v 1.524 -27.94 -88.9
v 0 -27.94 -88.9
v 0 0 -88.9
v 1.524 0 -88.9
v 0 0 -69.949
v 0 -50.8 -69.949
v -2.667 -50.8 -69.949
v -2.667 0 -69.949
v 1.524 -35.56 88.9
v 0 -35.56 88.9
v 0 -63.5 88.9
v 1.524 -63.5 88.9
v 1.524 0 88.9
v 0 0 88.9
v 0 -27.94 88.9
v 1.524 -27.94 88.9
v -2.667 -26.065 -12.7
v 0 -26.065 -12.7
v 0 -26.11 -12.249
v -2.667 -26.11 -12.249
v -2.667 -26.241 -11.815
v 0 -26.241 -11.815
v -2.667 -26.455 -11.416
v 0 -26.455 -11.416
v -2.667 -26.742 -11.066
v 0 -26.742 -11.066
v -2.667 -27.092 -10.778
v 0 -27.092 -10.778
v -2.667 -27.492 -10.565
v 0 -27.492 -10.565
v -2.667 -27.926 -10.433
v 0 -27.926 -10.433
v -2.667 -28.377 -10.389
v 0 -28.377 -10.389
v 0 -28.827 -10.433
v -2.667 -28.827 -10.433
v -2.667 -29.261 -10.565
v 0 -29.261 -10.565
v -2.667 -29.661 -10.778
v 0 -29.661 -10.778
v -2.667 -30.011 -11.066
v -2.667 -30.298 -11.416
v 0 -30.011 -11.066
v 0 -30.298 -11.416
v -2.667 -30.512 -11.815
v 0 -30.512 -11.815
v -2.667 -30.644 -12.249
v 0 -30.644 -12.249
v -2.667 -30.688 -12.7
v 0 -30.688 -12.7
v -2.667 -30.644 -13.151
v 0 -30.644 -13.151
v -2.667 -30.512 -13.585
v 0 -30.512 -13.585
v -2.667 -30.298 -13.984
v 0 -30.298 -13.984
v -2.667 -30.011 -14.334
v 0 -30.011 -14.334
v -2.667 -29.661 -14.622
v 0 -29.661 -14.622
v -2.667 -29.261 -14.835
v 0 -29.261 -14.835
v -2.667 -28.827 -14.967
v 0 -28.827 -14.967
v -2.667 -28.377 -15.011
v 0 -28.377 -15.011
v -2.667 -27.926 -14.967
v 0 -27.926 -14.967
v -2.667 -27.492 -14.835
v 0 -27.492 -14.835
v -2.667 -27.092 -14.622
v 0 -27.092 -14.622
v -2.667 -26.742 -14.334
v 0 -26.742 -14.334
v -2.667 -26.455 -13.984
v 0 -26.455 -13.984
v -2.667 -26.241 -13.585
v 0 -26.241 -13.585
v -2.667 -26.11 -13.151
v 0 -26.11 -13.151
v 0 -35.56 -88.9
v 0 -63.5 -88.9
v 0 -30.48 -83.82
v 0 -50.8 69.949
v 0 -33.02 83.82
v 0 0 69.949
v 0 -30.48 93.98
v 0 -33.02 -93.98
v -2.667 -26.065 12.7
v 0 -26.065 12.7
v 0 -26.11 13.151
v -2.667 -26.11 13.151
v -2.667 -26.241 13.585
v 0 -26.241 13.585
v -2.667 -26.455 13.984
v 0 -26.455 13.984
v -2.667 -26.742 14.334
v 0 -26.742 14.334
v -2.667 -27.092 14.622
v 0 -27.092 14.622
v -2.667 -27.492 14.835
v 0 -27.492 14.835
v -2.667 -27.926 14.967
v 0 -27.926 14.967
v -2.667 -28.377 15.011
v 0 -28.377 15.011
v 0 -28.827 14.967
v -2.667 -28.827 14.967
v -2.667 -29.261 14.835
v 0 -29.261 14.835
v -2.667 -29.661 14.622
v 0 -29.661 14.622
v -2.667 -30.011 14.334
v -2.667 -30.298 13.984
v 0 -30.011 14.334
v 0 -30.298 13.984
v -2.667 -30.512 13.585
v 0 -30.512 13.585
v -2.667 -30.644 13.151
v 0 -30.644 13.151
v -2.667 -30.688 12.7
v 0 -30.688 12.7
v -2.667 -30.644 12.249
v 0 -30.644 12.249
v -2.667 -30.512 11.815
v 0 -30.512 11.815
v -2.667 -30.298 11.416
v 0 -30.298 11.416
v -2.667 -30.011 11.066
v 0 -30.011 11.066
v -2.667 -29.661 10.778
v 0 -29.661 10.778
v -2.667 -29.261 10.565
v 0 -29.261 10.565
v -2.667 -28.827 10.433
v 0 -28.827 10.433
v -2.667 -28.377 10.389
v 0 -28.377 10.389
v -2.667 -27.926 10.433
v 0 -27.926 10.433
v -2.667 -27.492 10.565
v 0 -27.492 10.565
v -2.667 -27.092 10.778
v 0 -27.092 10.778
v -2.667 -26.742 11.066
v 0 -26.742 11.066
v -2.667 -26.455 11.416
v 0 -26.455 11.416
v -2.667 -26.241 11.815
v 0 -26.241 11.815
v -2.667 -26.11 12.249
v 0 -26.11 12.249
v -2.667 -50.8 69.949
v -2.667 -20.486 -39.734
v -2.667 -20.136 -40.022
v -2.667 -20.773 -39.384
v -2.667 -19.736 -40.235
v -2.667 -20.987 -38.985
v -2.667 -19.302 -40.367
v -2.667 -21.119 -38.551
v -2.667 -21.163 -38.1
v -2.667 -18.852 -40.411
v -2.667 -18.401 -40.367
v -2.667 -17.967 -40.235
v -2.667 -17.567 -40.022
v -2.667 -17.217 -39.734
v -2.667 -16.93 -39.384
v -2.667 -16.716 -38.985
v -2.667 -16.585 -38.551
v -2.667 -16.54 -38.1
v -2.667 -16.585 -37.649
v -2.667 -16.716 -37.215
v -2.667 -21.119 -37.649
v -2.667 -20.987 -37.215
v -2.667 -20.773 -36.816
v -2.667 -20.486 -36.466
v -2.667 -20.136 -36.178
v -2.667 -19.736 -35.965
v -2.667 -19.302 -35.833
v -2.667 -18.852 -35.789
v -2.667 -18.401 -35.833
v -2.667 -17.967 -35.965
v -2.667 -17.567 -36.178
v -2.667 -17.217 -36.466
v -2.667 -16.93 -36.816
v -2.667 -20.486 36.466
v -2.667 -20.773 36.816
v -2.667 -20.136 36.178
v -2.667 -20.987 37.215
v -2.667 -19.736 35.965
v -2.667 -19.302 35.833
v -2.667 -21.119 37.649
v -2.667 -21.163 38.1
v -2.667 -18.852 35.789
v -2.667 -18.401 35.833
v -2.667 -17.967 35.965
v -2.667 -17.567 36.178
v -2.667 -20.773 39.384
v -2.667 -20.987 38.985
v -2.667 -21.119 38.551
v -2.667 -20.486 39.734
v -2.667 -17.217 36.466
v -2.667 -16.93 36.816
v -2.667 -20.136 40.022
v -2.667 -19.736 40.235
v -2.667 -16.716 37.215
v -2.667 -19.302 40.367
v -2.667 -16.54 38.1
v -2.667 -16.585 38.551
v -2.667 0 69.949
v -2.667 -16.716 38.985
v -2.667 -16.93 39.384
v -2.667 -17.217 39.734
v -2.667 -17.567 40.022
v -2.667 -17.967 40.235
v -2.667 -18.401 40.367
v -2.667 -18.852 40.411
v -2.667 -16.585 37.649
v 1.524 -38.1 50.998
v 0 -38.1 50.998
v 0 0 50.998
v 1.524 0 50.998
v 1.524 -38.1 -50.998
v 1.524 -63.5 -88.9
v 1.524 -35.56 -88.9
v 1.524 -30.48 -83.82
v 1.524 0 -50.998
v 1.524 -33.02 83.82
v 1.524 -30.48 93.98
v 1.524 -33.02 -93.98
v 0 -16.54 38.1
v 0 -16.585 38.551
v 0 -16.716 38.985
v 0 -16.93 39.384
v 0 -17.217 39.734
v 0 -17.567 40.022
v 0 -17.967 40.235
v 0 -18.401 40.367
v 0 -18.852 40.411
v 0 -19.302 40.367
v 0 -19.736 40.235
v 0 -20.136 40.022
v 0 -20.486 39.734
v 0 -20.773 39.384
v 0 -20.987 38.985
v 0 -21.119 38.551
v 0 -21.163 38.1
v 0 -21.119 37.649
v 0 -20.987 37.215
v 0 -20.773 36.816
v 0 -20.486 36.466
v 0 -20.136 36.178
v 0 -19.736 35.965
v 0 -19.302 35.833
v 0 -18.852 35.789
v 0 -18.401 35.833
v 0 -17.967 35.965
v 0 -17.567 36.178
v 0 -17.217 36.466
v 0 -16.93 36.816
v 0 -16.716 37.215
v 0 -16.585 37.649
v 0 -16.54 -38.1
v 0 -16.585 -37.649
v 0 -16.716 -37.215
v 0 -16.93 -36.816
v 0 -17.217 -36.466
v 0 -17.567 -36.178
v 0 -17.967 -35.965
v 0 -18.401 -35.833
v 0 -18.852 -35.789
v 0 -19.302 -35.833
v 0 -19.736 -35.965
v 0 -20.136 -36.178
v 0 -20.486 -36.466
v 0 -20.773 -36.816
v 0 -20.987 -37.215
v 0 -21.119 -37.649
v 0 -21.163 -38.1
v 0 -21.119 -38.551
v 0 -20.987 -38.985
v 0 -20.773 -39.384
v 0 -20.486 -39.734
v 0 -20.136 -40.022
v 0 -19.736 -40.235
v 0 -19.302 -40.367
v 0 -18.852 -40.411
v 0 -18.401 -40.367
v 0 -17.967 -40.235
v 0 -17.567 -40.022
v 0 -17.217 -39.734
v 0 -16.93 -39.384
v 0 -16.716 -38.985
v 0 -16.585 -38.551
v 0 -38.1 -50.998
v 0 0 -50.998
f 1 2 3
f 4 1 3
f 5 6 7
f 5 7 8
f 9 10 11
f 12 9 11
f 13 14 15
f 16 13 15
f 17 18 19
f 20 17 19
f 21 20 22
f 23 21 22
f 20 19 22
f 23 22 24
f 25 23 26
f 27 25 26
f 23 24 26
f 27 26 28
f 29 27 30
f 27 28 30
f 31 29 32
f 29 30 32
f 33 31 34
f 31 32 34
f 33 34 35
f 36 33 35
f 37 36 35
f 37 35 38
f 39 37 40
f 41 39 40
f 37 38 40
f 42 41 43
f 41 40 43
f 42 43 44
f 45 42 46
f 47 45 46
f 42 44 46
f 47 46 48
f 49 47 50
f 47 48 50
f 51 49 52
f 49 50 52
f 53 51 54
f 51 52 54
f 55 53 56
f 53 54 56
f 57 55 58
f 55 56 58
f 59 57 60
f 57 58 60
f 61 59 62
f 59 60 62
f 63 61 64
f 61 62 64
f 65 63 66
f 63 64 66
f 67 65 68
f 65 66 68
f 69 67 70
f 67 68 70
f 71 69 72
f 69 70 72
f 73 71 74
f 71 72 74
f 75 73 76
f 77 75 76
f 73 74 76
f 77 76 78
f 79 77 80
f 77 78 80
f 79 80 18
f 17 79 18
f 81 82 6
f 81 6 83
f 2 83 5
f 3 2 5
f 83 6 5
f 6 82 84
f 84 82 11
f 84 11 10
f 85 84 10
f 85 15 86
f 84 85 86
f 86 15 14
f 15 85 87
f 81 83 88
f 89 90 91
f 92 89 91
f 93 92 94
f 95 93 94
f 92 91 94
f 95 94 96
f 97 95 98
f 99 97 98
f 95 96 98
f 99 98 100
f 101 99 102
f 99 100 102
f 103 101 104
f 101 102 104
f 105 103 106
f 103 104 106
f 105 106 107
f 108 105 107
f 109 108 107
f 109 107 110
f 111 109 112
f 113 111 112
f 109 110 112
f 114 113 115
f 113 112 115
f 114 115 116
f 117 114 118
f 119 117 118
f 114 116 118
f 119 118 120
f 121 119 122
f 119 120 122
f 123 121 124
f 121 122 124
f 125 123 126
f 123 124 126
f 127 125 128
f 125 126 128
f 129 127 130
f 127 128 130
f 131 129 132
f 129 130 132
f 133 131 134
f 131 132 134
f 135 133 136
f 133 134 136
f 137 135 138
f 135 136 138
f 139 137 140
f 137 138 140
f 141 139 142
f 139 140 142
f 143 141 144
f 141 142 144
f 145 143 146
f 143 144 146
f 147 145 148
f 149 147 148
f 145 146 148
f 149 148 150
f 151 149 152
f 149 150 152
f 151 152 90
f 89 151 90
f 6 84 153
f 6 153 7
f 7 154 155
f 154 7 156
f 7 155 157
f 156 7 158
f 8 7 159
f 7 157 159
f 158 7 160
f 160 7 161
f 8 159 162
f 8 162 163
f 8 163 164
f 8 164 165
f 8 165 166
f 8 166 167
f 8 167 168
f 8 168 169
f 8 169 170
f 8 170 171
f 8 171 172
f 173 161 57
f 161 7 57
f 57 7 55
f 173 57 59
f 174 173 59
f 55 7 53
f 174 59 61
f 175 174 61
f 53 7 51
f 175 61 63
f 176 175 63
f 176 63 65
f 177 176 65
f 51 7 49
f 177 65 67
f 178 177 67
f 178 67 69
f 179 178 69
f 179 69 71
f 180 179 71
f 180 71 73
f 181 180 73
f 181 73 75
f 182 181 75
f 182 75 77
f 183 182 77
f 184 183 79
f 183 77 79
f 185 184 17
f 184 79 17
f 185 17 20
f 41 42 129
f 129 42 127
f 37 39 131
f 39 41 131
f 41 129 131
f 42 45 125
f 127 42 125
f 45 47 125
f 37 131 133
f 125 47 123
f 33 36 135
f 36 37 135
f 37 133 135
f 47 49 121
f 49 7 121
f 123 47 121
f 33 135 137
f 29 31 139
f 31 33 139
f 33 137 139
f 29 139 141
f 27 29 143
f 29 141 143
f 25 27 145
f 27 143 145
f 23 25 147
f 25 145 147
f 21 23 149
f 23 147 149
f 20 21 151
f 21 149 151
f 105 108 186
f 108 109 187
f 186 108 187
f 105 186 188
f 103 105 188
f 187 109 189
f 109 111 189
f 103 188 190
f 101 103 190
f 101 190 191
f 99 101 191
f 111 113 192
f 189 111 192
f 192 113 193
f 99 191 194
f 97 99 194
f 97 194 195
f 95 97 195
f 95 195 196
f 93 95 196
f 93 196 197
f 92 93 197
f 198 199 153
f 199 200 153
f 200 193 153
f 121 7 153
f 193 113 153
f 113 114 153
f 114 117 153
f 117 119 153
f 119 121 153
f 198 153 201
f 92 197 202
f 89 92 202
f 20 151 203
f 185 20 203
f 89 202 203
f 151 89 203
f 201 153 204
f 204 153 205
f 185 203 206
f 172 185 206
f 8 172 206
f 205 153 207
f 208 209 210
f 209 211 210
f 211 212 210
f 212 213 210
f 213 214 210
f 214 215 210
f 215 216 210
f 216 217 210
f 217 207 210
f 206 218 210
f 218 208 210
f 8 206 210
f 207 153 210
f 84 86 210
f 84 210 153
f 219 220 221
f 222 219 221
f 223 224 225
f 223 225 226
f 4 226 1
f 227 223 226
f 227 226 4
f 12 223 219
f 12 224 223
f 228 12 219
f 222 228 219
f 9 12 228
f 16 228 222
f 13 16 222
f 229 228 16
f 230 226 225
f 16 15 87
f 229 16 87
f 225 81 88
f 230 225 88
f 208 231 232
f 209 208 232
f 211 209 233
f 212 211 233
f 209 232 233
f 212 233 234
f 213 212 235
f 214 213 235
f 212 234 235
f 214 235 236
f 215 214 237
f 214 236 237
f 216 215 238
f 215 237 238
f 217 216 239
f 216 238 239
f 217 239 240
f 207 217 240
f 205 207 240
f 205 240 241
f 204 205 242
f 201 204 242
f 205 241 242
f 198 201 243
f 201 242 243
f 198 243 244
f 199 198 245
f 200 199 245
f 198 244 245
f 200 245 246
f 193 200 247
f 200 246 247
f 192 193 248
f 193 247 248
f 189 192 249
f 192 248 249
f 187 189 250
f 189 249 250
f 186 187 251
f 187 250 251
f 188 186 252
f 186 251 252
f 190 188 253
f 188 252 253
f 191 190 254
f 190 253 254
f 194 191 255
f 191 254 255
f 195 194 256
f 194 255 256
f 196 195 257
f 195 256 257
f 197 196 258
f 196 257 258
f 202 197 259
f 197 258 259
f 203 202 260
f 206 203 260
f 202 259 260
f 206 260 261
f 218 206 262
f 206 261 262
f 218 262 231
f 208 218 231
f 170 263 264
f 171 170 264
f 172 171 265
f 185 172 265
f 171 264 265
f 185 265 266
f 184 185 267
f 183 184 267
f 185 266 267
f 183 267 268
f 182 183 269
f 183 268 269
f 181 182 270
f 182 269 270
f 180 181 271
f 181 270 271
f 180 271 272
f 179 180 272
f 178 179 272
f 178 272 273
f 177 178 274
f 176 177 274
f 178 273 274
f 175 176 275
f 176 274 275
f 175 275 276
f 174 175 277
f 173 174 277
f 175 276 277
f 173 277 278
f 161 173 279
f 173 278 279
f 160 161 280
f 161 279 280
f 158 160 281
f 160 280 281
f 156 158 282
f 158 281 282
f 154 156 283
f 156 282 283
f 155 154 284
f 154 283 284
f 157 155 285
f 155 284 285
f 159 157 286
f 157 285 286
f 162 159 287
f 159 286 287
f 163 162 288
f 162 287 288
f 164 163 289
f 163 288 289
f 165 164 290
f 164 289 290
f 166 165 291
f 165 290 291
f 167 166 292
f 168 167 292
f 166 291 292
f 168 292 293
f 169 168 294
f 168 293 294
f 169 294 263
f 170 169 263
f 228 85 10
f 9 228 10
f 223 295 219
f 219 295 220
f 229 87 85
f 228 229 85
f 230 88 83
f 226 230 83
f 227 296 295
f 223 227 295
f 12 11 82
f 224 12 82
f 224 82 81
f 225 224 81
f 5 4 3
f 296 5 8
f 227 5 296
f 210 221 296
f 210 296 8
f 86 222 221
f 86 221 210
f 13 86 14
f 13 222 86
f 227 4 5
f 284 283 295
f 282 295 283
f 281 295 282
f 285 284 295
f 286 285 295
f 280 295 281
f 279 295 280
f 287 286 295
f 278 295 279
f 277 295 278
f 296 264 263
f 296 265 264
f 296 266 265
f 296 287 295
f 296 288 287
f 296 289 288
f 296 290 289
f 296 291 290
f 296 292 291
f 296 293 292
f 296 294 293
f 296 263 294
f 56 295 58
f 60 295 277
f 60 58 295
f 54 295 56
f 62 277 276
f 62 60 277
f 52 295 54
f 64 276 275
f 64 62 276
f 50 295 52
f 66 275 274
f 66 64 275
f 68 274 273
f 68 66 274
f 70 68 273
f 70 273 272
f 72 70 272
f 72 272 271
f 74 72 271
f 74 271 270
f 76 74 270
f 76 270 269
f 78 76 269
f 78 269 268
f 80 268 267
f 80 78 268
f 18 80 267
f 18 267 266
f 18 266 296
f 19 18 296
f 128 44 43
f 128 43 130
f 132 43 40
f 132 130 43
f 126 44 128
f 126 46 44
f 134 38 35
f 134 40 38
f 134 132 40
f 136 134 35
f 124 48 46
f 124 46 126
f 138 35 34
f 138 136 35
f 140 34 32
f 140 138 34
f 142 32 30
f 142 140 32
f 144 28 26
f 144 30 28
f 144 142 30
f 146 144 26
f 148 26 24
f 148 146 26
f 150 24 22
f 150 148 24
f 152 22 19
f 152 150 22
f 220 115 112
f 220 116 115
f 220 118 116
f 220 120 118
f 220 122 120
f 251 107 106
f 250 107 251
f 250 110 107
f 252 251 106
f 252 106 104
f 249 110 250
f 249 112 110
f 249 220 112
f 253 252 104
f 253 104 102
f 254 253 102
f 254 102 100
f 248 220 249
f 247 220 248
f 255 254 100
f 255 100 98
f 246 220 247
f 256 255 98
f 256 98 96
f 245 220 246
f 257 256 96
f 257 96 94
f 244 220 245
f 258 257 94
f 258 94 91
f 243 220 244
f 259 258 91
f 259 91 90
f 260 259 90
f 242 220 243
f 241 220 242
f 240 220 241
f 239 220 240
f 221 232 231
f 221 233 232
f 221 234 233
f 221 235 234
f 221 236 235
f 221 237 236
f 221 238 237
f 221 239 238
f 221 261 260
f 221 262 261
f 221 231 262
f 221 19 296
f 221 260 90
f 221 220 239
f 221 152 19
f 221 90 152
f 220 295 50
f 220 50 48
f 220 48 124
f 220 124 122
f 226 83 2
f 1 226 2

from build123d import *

# Parameters (mm, degrees)
F1_DEPTH = 1.524
F0_W     = 38.1
F0_H     = 101.996876
F0_R     = 2.3114
F2_DEPTH = 2.667


with BuildPart() as f1:
    # F0 (on Right) → F1 (new body)
    with BuildSketch(Plane.YZ):
        Polygon((0, 69.949219), (0, 88.9), (-27.94, 88.9), (-30.48, 93.98), (-33.02, 83.82), (-35.56, 88.9), (-63.5, 88.9), (-63.5, -88.9), (-35.56, -88.9), (-33.02, -93.98), (-30.48, -83.82), (-27.94, -88.9), (0, -88.9), (0, -69.949219), (-50.8, -69.949219), (-50.8, 69.949219), align=None)
        Polygon((0, 50.998438), (0, 69.949219), (-50.8, 69.949219), (-50.8, -69.949219), (0, -69.949219), (0, -50.998438), (-38.1, -50.998438), (-38.1, 50.998438), align=None)
    extrude(amount=F1_DEPTH)

    # F0 (on Right) → F2 (join)
    with BuildSketch(Plane.YZ):
        Polygon((0, 50.998438), (0, 69.949219), (-50.8, 69.949219), (-50.8, -69.949219), (0, -69.949219), (0, -50.998438), (-38.1, -50.998438), (-38.1, 50.998438), align=None)
        with Locations((-19.05, 0)):
            Rectangle(F0_W, F0_H)
        with Locations((-18.851562, -38.1)):
            Circle(F0_R, mode=Mode.SUBTRACT)
        with Locations((-28.376562, -12.7)):
            Circle(F0_R, mode=Mode.SUBTRACT)
        with Locations((-28.376562, 12.7)):
            Circle(F0_R, mode=Mode.SUBTRACT)
        with Locations((-18.851562, 38.1)):
            Circle(F0_R, mode=Mode.SUBTRACT)
    extrude(amount=-F2_DEPTH)


solid = f1.part
